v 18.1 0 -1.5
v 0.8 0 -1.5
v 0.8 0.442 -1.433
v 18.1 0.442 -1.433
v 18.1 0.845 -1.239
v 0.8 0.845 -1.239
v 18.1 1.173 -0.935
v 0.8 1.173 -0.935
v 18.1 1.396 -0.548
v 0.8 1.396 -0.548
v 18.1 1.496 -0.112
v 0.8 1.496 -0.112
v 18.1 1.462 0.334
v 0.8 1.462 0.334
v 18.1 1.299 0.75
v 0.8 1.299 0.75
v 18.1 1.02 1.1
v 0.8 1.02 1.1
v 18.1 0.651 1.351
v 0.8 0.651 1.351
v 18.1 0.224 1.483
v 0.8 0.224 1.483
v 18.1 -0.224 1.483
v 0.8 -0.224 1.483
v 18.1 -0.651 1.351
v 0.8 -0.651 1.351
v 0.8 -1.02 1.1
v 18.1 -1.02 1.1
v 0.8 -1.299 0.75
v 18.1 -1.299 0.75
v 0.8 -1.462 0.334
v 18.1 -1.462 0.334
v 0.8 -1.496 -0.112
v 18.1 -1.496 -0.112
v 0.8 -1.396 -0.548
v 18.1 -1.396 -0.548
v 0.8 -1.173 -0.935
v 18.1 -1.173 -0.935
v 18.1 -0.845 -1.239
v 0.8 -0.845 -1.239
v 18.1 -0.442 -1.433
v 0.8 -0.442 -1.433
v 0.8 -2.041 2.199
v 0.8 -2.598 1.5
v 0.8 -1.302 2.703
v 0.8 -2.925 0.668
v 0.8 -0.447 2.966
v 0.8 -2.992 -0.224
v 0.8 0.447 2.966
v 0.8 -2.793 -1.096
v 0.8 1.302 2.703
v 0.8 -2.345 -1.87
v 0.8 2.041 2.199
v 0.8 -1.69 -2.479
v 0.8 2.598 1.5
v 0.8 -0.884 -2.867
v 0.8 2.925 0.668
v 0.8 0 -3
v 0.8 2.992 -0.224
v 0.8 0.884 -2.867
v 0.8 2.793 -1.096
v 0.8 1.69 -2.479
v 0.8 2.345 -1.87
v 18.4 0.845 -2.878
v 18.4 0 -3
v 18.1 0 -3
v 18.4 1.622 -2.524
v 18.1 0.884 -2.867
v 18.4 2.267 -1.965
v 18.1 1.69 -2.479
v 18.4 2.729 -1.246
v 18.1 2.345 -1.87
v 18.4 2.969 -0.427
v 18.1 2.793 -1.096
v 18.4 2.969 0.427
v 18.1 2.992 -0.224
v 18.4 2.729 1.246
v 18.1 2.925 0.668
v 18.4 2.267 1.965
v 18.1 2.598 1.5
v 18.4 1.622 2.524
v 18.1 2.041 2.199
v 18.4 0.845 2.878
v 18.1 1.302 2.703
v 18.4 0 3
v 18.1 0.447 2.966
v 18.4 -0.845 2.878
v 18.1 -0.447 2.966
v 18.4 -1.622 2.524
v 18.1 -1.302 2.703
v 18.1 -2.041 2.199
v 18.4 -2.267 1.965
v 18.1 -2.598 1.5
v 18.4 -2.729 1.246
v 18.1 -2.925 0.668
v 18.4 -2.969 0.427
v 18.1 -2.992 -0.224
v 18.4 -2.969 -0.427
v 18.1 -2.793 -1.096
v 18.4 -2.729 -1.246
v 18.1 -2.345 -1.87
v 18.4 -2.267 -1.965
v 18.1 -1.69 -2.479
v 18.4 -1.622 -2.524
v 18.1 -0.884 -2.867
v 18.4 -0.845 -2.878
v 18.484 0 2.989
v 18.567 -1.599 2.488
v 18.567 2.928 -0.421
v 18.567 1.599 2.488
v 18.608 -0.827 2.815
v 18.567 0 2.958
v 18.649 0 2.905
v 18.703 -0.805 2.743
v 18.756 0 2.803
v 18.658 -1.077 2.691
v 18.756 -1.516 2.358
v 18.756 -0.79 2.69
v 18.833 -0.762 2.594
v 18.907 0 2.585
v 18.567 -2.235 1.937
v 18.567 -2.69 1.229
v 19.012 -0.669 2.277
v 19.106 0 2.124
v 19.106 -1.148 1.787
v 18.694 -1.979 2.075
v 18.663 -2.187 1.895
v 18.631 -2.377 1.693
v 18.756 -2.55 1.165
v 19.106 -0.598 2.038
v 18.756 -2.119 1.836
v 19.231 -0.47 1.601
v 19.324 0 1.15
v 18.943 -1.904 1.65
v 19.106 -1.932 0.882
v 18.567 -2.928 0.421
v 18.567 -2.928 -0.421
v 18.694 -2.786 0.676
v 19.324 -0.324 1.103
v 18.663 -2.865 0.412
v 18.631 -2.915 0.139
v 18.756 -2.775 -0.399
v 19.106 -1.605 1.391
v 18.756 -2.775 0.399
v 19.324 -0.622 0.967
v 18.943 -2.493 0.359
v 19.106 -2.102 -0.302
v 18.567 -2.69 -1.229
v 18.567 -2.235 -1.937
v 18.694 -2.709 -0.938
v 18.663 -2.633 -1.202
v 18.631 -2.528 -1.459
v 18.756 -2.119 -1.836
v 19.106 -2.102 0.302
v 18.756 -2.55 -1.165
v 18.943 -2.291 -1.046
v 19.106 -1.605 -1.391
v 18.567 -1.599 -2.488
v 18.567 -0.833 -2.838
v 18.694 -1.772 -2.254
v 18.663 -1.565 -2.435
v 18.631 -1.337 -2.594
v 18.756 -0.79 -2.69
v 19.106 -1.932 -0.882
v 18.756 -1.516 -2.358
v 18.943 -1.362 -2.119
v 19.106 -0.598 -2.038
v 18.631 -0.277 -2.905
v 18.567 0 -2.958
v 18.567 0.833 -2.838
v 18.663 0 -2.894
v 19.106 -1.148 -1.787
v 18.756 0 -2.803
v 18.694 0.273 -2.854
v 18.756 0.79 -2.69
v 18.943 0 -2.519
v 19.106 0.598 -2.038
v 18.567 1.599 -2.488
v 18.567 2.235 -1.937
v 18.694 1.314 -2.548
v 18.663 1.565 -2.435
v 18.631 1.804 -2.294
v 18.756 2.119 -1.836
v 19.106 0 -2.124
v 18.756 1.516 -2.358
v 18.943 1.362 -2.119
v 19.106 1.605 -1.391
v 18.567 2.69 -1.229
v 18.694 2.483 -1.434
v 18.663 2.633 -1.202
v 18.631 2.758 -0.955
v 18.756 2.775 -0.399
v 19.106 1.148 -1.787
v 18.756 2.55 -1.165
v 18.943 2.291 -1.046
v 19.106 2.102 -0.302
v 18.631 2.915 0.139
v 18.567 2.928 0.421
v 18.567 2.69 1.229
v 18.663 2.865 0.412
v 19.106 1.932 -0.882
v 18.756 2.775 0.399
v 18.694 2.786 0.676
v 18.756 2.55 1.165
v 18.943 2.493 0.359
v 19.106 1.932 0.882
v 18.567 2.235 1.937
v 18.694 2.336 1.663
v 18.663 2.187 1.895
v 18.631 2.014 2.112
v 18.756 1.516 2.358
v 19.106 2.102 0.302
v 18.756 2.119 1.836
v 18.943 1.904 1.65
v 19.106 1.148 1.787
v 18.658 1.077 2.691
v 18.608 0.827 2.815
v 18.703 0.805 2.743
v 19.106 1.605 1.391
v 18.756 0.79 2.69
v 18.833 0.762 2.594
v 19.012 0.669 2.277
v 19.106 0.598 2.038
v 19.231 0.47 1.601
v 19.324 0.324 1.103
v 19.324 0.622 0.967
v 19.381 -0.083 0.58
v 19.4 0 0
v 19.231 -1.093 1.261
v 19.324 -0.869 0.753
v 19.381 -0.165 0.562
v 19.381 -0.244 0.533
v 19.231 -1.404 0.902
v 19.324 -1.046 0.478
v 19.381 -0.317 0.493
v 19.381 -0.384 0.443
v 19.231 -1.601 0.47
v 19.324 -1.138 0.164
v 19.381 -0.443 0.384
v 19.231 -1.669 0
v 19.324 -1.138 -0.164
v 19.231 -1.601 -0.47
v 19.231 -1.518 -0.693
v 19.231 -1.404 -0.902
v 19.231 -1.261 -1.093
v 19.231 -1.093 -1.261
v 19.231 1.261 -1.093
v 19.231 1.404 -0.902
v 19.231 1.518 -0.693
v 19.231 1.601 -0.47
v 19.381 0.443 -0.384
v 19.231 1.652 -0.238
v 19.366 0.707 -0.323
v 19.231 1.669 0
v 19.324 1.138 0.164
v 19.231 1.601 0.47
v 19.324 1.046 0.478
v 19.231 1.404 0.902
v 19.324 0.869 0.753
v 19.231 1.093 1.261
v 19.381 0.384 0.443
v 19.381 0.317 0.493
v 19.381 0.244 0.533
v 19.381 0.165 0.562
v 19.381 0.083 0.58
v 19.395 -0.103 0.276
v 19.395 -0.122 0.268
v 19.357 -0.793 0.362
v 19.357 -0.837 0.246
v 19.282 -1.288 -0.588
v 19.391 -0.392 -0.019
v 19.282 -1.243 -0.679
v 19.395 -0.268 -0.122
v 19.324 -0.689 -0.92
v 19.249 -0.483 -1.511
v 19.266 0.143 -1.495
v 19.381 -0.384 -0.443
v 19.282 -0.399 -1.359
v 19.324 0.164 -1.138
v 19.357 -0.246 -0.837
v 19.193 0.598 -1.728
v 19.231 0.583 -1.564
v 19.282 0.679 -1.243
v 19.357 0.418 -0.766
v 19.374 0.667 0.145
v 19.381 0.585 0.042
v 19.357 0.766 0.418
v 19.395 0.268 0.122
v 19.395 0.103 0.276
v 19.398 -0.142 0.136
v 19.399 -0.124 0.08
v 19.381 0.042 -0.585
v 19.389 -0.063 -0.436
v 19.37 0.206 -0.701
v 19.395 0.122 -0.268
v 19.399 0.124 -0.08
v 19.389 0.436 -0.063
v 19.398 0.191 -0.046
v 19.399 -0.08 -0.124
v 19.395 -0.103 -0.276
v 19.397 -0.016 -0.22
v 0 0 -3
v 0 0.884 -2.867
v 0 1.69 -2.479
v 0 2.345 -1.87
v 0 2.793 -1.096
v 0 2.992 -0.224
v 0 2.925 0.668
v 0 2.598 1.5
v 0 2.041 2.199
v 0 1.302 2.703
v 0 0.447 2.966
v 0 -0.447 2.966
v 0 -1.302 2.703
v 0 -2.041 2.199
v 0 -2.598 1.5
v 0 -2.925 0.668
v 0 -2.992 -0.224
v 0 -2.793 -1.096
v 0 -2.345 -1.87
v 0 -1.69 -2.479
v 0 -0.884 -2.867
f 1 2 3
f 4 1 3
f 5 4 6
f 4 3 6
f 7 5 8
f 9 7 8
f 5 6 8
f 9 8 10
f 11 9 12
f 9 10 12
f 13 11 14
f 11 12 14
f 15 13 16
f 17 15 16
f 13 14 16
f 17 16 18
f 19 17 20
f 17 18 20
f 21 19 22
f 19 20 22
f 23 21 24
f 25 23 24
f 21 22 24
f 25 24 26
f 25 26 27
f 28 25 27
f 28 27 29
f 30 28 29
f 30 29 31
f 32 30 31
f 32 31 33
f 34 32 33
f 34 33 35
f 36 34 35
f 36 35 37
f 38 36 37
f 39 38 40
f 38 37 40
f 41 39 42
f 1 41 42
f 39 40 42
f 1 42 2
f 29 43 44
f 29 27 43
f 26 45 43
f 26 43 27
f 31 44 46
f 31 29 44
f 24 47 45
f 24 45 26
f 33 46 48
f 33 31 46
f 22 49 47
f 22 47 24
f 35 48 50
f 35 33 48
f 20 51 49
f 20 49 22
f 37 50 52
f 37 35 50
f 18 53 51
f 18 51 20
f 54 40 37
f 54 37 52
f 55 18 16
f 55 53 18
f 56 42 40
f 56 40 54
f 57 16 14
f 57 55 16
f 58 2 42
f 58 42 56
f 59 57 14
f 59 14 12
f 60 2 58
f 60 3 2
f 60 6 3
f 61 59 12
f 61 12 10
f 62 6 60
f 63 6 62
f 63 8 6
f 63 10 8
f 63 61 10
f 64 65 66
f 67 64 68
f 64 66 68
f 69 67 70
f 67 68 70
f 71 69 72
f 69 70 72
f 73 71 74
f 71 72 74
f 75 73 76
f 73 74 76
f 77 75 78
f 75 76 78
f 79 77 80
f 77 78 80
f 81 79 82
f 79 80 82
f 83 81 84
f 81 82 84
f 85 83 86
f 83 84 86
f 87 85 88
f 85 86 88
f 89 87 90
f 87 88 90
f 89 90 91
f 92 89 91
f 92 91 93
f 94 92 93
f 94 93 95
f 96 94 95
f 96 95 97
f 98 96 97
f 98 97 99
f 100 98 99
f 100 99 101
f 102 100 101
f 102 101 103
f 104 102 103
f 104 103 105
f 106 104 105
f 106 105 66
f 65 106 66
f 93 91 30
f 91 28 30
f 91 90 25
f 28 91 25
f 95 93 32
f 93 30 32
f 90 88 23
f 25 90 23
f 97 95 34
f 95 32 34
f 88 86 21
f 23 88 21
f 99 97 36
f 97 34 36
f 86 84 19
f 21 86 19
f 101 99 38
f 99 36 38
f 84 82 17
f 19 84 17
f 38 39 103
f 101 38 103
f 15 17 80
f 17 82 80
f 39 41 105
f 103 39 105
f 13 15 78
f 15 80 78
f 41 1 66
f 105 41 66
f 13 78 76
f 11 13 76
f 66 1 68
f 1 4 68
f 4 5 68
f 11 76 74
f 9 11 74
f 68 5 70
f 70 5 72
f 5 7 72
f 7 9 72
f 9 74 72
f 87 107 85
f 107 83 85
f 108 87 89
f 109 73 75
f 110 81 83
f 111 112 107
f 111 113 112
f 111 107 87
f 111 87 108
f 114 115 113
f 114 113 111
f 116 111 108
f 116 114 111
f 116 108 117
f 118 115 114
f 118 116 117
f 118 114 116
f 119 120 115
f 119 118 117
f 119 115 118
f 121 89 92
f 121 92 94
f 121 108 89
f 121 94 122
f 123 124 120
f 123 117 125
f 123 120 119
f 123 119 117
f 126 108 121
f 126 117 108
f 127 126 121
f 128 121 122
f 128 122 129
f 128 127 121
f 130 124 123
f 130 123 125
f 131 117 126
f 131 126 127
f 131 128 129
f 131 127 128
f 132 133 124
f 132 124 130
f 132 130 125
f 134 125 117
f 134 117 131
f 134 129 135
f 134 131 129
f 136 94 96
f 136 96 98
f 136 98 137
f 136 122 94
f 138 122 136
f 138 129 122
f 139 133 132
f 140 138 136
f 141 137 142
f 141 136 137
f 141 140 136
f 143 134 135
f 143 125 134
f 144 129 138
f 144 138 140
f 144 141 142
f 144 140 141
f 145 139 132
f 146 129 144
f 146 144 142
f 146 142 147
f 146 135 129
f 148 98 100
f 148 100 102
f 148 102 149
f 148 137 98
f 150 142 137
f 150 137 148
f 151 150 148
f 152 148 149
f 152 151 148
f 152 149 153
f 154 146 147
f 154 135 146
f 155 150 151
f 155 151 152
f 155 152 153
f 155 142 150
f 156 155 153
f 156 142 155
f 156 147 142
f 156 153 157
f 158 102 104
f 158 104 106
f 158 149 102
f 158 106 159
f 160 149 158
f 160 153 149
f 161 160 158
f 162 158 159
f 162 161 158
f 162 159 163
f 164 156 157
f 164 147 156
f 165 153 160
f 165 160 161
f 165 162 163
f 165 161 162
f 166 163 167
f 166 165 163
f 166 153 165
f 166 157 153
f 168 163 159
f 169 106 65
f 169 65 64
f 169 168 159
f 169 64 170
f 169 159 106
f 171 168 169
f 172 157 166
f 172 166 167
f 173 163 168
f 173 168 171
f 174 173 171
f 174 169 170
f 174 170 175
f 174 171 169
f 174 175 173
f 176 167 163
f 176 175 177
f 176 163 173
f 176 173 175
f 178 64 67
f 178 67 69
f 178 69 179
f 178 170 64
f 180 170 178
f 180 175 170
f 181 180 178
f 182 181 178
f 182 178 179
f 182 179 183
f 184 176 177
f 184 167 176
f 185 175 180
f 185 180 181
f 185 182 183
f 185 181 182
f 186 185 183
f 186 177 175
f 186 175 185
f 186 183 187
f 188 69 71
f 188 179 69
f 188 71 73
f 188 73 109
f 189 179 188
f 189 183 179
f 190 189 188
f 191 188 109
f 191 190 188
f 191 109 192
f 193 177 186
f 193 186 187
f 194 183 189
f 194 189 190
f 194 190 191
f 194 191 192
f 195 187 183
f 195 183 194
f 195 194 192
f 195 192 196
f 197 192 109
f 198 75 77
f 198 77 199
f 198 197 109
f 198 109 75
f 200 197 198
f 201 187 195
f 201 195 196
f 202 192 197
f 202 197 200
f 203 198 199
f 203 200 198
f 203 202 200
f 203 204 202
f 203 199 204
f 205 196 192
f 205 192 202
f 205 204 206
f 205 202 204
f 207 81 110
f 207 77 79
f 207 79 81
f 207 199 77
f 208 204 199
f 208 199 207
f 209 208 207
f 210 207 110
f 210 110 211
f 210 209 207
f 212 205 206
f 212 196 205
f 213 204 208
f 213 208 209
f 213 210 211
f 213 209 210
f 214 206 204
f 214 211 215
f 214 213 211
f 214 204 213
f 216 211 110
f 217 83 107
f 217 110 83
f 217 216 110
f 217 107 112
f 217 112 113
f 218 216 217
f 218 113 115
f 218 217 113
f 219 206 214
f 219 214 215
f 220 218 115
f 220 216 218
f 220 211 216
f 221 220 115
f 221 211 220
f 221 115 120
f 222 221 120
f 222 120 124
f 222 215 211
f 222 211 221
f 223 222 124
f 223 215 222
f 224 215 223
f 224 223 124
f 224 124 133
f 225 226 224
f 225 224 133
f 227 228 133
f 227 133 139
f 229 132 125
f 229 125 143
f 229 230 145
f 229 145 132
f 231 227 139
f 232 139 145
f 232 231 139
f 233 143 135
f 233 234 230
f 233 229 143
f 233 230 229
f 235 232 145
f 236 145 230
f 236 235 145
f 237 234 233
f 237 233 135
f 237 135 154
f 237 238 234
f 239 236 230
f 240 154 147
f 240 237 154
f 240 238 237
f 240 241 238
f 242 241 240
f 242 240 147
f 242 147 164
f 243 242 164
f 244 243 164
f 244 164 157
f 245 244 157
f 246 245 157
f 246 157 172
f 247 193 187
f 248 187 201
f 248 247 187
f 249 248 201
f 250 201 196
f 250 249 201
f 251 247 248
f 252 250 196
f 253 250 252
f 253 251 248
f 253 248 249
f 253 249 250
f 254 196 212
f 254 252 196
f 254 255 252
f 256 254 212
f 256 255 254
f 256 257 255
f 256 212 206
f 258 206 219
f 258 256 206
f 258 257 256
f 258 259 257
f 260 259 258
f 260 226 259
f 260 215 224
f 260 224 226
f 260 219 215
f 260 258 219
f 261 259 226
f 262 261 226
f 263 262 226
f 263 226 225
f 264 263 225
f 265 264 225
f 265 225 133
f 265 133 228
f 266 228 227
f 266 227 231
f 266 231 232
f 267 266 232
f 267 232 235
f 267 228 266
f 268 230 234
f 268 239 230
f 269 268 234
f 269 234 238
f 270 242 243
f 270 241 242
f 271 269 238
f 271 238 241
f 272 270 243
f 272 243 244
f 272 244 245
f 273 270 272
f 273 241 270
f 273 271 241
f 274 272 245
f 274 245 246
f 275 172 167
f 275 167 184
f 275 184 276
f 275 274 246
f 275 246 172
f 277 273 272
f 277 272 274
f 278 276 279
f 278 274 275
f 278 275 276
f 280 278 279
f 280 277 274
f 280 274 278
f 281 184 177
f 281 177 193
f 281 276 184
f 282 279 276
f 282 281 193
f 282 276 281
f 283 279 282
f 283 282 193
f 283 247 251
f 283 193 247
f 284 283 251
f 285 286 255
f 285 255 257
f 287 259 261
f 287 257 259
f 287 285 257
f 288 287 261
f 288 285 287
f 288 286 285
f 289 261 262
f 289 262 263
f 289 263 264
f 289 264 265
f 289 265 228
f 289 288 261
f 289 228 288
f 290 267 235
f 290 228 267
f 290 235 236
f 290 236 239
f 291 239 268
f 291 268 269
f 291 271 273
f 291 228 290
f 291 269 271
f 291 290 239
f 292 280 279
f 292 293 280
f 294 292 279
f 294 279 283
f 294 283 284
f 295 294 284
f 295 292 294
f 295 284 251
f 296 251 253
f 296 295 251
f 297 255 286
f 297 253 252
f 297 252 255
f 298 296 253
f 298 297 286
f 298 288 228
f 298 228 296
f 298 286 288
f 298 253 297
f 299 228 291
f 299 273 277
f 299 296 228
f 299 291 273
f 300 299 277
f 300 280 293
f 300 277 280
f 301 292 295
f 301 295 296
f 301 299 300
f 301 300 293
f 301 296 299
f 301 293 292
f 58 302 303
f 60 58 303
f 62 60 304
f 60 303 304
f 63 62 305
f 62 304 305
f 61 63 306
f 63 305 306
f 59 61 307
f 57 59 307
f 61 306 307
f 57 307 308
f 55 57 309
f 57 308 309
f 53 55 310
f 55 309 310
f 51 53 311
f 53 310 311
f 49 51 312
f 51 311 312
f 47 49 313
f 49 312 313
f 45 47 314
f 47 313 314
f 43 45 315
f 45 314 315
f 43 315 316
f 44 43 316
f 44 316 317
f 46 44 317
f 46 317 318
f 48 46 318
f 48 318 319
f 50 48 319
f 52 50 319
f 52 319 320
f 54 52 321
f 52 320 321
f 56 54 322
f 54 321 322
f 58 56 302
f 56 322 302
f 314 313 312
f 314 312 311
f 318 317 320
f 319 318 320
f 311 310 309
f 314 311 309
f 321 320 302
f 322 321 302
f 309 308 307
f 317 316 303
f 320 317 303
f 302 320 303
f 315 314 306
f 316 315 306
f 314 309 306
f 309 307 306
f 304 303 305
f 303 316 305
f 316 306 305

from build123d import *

# Parameters (mm, degrees)
CROQUIS1_R              = 3
SALIENTE_EXTRUIR1_DEPTH = 0.8
CROQUIS2_R              = 1.5
SALIENTE_EXTRUIR2_DEPTH = 17.3
CROQUIS3_R              = 3
SALIENTE_EXTRUIR3_DEPTH = 0.3
C_PULA1_FACE_RADIUS     = 3
C_PULA1_HEIGHT          = 1


with BuildPart() as part:
    # Croquis1 → Saliente-Extruir1 (new body)
    with BuildSketch(Plane(origin=(0, 0, 0), x_dir=(0, 0, -1), z_dir=(1, 0, 0))):
        Circle(CROQUIS1_R)
    extrude(amount=SALIENTE_EXTRUIR1_DEPTH)

    # Croquis2 → Saliente-Extruir2 (add)
    with BuildSketch(Plane(origin=(0.8, 0, 0), x_dir=(0, 0, -1), z_dir=(1, 0, 0))):
        Circle(CROQUIS2_R)
    extrude(amount=SALIENTE_EXTRUIR2_DEPTH)

    # Croquis3 → Saliente-Extruir3 (add)
    with BuildSketch(Plane(origin=(18.1, 0, 0), x_dir=(0, 0, -1), z_dir=(1, 0, 0))):
        Circle(CROQUIS3_R)
    extrude(amount=SALIENTE_EXTRUIR3_DEPTH)

    # Cúpula1: an elliptical dome of height H over a round flat face of radius A is half a spheroid: the quarter ellipse of half axes A and H revolved about the face's axis
    with BuildSketch(Plane((18.4, 0, 0), x_dir=(0, 0, 1), z_dir=(0, 1, 0)), mode=Mode.PRIVATE) as c_pula1_quarter:
        Ellipse(C_PULA1_FACE_RADIUS, C_PULA1_HEIGHT)
        Rectangle(C_PULA1_FACE_RADIUS, C_PULA1_HEIGHT, align=(Align.MIN, Align.MIN), mode=Mode.INTERSECT)
    revolve(c_pula1_quarter.sketch, axis=Axis((18.4, 0, 0), (1, 0, 0)))


solid = part.part
